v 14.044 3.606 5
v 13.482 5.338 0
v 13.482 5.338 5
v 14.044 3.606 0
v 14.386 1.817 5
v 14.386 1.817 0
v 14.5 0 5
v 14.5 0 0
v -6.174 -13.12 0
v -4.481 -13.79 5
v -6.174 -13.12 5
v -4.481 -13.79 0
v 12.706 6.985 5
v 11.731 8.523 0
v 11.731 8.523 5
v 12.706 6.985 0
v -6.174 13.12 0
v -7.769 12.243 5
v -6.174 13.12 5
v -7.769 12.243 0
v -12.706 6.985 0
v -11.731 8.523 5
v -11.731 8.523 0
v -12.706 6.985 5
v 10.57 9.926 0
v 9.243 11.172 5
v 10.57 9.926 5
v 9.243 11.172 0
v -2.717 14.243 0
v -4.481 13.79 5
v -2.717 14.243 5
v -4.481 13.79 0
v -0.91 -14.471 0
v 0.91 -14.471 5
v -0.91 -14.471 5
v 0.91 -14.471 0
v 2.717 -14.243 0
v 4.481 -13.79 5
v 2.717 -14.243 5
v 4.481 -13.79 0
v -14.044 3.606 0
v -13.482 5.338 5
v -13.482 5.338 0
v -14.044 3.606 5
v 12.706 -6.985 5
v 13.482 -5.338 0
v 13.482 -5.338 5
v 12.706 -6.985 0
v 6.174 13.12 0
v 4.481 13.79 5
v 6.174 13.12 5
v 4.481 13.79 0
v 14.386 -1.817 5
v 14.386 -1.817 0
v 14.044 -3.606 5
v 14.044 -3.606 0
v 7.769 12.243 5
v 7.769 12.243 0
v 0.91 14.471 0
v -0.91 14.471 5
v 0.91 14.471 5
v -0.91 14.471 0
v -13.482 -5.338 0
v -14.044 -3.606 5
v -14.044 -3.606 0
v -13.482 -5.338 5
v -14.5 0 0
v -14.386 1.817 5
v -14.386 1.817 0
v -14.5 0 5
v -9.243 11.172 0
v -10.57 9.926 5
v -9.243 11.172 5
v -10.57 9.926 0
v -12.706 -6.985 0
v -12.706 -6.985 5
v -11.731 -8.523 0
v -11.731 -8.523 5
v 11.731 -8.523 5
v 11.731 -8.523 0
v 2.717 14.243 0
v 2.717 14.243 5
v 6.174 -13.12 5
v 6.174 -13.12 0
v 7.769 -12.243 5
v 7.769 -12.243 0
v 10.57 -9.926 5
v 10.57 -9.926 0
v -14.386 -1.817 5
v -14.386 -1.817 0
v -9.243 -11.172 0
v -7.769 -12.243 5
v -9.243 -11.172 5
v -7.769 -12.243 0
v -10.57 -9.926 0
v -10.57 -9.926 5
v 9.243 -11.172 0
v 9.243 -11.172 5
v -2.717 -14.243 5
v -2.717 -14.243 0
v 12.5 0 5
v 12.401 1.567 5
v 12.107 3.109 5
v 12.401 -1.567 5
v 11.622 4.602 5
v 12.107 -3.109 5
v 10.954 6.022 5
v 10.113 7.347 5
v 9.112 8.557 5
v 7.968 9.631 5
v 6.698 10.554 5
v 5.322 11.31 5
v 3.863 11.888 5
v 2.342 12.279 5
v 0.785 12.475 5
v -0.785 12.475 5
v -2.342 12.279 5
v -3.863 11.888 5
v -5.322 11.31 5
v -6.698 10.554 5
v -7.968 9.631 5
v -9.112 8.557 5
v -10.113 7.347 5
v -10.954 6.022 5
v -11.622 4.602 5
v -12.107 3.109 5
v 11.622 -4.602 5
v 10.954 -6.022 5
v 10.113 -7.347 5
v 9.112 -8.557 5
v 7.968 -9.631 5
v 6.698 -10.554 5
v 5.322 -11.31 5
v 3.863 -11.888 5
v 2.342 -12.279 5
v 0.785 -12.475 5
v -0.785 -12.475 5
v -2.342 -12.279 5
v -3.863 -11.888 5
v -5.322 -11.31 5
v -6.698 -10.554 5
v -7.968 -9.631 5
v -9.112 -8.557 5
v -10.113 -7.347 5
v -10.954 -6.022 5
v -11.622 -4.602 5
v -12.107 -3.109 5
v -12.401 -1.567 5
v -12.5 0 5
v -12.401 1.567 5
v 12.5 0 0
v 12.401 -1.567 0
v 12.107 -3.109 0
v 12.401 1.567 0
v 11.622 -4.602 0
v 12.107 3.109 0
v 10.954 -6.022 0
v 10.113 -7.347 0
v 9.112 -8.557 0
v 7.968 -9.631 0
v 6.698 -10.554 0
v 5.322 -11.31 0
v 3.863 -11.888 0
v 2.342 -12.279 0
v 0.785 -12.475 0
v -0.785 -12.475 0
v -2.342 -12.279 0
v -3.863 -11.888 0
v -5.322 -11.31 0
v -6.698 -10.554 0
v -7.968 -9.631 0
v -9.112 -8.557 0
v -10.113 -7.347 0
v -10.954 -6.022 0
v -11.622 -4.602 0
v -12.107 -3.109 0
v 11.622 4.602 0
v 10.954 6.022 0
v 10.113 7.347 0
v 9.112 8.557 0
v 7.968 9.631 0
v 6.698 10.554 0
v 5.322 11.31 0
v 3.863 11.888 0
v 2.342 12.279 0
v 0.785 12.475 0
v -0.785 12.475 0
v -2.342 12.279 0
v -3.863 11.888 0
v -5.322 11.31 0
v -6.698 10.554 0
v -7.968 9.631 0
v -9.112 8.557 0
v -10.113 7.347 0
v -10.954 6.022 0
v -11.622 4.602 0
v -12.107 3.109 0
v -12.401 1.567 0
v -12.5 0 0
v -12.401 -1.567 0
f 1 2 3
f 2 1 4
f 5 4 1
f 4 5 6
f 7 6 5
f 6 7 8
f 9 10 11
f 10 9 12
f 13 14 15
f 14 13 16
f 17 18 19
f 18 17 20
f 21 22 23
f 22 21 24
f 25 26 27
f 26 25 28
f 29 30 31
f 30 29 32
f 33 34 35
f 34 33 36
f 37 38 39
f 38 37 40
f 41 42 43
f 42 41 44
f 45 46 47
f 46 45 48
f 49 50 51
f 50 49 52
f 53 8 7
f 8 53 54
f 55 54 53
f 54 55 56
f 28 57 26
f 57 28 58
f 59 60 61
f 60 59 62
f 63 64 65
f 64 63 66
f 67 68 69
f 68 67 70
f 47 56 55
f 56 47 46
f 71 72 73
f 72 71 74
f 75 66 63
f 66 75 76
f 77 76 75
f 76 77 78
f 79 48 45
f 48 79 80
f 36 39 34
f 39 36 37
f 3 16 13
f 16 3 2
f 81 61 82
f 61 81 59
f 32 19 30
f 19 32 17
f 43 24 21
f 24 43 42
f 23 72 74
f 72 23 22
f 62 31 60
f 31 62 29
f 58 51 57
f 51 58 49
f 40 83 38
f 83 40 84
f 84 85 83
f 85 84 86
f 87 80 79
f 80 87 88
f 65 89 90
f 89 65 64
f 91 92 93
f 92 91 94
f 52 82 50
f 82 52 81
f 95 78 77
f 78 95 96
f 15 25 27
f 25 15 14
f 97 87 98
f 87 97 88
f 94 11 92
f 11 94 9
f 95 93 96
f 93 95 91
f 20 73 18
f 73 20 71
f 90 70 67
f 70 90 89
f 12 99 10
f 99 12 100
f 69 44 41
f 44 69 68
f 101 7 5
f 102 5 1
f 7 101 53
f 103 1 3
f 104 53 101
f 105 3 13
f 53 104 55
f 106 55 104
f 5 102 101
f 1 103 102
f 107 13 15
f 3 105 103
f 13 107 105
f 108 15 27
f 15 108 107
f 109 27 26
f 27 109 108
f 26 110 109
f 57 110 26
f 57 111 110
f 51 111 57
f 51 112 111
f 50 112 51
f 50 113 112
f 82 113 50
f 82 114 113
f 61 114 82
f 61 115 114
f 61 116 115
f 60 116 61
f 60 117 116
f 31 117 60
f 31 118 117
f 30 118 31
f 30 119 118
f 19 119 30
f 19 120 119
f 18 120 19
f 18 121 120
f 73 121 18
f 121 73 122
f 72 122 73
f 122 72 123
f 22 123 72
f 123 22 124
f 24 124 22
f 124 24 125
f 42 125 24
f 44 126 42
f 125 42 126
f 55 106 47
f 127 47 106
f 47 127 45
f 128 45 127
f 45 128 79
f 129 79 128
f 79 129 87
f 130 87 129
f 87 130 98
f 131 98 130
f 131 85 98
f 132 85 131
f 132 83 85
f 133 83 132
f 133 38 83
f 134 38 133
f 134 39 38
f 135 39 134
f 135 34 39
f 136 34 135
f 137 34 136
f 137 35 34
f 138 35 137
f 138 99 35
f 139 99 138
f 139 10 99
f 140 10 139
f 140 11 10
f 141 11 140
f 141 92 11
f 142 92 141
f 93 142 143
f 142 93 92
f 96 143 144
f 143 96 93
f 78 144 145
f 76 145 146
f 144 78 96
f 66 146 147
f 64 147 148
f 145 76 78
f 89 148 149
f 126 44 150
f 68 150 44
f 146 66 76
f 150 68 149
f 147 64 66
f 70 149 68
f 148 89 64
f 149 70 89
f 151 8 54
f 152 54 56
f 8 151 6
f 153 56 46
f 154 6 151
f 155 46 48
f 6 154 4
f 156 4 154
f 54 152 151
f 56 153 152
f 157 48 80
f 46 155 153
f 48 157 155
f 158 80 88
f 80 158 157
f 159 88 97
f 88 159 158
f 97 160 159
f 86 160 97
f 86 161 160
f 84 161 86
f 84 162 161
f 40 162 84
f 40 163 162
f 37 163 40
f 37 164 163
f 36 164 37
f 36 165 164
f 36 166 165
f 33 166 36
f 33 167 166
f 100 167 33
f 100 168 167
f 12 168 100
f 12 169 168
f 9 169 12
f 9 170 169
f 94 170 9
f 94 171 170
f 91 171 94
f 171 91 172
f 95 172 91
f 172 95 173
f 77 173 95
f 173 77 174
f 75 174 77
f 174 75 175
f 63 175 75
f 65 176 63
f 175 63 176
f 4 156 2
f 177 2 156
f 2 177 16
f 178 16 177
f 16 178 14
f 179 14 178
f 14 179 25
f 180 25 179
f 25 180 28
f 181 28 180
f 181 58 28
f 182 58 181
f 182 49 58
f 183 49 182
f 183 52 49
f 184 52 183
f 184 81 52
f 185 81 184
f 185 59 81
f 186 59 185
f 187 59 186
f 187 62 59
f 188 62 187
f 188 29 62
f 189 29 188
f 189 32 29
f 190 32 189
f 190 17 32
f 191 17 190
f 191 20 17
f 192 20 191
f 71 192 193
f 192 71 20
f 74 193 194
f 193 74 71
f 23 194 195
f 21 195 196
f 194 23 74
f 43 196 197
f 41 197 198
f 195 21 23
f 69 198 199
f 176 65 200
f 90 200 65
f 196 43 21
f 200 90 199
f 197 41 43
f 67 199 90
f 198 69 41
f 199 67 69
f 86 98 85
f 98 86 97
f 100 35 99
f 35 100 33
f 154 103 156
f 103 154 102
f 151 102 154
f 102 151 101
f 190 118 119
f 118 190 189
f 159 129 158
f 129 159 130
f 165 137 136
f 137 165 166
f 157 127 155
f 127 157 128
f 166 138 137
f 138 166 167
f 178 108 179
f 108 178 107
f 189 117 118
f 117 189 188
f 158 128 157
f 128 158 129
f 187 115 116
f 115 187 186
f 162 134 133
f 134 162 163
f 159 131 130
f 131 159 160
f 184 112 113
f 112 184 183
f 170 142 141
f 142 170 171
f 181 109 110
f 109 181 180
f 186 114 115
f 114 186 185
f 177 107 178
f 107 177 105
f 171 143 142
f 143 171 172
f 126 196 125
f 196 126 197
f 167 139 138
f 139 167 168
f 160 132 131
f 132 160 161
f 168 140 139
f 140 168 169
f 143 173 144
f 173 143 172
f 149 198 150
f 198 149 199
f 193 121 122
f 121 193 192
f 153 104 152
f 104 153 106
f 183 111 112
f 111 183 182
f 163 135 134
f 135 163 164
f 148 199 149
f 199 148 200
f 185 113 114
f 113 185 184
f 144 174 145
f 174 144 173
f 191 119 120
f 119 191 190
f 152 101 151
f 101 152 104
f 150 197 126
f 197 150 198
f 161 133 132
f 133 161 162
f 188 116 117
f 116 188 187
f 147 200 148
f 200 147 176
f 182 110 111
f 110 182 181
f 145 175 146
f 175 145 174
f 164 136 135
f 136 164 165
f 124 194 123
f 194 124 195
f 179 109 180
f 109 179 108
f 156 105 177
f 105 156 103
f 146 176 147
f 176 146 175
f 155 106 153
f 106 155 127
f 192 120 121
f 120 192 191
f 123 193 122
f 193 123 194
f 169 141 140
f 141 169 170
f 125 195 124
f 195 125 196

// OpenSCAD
$fn = 50;

shell = 2;
innerRadius = 25/2;
outerRadius = innerRadius + shell;
height = 5;

difference() {
    cylinder(height, r=outerRadius);
    cylinder(height + 2, r=innerRadius);
}
